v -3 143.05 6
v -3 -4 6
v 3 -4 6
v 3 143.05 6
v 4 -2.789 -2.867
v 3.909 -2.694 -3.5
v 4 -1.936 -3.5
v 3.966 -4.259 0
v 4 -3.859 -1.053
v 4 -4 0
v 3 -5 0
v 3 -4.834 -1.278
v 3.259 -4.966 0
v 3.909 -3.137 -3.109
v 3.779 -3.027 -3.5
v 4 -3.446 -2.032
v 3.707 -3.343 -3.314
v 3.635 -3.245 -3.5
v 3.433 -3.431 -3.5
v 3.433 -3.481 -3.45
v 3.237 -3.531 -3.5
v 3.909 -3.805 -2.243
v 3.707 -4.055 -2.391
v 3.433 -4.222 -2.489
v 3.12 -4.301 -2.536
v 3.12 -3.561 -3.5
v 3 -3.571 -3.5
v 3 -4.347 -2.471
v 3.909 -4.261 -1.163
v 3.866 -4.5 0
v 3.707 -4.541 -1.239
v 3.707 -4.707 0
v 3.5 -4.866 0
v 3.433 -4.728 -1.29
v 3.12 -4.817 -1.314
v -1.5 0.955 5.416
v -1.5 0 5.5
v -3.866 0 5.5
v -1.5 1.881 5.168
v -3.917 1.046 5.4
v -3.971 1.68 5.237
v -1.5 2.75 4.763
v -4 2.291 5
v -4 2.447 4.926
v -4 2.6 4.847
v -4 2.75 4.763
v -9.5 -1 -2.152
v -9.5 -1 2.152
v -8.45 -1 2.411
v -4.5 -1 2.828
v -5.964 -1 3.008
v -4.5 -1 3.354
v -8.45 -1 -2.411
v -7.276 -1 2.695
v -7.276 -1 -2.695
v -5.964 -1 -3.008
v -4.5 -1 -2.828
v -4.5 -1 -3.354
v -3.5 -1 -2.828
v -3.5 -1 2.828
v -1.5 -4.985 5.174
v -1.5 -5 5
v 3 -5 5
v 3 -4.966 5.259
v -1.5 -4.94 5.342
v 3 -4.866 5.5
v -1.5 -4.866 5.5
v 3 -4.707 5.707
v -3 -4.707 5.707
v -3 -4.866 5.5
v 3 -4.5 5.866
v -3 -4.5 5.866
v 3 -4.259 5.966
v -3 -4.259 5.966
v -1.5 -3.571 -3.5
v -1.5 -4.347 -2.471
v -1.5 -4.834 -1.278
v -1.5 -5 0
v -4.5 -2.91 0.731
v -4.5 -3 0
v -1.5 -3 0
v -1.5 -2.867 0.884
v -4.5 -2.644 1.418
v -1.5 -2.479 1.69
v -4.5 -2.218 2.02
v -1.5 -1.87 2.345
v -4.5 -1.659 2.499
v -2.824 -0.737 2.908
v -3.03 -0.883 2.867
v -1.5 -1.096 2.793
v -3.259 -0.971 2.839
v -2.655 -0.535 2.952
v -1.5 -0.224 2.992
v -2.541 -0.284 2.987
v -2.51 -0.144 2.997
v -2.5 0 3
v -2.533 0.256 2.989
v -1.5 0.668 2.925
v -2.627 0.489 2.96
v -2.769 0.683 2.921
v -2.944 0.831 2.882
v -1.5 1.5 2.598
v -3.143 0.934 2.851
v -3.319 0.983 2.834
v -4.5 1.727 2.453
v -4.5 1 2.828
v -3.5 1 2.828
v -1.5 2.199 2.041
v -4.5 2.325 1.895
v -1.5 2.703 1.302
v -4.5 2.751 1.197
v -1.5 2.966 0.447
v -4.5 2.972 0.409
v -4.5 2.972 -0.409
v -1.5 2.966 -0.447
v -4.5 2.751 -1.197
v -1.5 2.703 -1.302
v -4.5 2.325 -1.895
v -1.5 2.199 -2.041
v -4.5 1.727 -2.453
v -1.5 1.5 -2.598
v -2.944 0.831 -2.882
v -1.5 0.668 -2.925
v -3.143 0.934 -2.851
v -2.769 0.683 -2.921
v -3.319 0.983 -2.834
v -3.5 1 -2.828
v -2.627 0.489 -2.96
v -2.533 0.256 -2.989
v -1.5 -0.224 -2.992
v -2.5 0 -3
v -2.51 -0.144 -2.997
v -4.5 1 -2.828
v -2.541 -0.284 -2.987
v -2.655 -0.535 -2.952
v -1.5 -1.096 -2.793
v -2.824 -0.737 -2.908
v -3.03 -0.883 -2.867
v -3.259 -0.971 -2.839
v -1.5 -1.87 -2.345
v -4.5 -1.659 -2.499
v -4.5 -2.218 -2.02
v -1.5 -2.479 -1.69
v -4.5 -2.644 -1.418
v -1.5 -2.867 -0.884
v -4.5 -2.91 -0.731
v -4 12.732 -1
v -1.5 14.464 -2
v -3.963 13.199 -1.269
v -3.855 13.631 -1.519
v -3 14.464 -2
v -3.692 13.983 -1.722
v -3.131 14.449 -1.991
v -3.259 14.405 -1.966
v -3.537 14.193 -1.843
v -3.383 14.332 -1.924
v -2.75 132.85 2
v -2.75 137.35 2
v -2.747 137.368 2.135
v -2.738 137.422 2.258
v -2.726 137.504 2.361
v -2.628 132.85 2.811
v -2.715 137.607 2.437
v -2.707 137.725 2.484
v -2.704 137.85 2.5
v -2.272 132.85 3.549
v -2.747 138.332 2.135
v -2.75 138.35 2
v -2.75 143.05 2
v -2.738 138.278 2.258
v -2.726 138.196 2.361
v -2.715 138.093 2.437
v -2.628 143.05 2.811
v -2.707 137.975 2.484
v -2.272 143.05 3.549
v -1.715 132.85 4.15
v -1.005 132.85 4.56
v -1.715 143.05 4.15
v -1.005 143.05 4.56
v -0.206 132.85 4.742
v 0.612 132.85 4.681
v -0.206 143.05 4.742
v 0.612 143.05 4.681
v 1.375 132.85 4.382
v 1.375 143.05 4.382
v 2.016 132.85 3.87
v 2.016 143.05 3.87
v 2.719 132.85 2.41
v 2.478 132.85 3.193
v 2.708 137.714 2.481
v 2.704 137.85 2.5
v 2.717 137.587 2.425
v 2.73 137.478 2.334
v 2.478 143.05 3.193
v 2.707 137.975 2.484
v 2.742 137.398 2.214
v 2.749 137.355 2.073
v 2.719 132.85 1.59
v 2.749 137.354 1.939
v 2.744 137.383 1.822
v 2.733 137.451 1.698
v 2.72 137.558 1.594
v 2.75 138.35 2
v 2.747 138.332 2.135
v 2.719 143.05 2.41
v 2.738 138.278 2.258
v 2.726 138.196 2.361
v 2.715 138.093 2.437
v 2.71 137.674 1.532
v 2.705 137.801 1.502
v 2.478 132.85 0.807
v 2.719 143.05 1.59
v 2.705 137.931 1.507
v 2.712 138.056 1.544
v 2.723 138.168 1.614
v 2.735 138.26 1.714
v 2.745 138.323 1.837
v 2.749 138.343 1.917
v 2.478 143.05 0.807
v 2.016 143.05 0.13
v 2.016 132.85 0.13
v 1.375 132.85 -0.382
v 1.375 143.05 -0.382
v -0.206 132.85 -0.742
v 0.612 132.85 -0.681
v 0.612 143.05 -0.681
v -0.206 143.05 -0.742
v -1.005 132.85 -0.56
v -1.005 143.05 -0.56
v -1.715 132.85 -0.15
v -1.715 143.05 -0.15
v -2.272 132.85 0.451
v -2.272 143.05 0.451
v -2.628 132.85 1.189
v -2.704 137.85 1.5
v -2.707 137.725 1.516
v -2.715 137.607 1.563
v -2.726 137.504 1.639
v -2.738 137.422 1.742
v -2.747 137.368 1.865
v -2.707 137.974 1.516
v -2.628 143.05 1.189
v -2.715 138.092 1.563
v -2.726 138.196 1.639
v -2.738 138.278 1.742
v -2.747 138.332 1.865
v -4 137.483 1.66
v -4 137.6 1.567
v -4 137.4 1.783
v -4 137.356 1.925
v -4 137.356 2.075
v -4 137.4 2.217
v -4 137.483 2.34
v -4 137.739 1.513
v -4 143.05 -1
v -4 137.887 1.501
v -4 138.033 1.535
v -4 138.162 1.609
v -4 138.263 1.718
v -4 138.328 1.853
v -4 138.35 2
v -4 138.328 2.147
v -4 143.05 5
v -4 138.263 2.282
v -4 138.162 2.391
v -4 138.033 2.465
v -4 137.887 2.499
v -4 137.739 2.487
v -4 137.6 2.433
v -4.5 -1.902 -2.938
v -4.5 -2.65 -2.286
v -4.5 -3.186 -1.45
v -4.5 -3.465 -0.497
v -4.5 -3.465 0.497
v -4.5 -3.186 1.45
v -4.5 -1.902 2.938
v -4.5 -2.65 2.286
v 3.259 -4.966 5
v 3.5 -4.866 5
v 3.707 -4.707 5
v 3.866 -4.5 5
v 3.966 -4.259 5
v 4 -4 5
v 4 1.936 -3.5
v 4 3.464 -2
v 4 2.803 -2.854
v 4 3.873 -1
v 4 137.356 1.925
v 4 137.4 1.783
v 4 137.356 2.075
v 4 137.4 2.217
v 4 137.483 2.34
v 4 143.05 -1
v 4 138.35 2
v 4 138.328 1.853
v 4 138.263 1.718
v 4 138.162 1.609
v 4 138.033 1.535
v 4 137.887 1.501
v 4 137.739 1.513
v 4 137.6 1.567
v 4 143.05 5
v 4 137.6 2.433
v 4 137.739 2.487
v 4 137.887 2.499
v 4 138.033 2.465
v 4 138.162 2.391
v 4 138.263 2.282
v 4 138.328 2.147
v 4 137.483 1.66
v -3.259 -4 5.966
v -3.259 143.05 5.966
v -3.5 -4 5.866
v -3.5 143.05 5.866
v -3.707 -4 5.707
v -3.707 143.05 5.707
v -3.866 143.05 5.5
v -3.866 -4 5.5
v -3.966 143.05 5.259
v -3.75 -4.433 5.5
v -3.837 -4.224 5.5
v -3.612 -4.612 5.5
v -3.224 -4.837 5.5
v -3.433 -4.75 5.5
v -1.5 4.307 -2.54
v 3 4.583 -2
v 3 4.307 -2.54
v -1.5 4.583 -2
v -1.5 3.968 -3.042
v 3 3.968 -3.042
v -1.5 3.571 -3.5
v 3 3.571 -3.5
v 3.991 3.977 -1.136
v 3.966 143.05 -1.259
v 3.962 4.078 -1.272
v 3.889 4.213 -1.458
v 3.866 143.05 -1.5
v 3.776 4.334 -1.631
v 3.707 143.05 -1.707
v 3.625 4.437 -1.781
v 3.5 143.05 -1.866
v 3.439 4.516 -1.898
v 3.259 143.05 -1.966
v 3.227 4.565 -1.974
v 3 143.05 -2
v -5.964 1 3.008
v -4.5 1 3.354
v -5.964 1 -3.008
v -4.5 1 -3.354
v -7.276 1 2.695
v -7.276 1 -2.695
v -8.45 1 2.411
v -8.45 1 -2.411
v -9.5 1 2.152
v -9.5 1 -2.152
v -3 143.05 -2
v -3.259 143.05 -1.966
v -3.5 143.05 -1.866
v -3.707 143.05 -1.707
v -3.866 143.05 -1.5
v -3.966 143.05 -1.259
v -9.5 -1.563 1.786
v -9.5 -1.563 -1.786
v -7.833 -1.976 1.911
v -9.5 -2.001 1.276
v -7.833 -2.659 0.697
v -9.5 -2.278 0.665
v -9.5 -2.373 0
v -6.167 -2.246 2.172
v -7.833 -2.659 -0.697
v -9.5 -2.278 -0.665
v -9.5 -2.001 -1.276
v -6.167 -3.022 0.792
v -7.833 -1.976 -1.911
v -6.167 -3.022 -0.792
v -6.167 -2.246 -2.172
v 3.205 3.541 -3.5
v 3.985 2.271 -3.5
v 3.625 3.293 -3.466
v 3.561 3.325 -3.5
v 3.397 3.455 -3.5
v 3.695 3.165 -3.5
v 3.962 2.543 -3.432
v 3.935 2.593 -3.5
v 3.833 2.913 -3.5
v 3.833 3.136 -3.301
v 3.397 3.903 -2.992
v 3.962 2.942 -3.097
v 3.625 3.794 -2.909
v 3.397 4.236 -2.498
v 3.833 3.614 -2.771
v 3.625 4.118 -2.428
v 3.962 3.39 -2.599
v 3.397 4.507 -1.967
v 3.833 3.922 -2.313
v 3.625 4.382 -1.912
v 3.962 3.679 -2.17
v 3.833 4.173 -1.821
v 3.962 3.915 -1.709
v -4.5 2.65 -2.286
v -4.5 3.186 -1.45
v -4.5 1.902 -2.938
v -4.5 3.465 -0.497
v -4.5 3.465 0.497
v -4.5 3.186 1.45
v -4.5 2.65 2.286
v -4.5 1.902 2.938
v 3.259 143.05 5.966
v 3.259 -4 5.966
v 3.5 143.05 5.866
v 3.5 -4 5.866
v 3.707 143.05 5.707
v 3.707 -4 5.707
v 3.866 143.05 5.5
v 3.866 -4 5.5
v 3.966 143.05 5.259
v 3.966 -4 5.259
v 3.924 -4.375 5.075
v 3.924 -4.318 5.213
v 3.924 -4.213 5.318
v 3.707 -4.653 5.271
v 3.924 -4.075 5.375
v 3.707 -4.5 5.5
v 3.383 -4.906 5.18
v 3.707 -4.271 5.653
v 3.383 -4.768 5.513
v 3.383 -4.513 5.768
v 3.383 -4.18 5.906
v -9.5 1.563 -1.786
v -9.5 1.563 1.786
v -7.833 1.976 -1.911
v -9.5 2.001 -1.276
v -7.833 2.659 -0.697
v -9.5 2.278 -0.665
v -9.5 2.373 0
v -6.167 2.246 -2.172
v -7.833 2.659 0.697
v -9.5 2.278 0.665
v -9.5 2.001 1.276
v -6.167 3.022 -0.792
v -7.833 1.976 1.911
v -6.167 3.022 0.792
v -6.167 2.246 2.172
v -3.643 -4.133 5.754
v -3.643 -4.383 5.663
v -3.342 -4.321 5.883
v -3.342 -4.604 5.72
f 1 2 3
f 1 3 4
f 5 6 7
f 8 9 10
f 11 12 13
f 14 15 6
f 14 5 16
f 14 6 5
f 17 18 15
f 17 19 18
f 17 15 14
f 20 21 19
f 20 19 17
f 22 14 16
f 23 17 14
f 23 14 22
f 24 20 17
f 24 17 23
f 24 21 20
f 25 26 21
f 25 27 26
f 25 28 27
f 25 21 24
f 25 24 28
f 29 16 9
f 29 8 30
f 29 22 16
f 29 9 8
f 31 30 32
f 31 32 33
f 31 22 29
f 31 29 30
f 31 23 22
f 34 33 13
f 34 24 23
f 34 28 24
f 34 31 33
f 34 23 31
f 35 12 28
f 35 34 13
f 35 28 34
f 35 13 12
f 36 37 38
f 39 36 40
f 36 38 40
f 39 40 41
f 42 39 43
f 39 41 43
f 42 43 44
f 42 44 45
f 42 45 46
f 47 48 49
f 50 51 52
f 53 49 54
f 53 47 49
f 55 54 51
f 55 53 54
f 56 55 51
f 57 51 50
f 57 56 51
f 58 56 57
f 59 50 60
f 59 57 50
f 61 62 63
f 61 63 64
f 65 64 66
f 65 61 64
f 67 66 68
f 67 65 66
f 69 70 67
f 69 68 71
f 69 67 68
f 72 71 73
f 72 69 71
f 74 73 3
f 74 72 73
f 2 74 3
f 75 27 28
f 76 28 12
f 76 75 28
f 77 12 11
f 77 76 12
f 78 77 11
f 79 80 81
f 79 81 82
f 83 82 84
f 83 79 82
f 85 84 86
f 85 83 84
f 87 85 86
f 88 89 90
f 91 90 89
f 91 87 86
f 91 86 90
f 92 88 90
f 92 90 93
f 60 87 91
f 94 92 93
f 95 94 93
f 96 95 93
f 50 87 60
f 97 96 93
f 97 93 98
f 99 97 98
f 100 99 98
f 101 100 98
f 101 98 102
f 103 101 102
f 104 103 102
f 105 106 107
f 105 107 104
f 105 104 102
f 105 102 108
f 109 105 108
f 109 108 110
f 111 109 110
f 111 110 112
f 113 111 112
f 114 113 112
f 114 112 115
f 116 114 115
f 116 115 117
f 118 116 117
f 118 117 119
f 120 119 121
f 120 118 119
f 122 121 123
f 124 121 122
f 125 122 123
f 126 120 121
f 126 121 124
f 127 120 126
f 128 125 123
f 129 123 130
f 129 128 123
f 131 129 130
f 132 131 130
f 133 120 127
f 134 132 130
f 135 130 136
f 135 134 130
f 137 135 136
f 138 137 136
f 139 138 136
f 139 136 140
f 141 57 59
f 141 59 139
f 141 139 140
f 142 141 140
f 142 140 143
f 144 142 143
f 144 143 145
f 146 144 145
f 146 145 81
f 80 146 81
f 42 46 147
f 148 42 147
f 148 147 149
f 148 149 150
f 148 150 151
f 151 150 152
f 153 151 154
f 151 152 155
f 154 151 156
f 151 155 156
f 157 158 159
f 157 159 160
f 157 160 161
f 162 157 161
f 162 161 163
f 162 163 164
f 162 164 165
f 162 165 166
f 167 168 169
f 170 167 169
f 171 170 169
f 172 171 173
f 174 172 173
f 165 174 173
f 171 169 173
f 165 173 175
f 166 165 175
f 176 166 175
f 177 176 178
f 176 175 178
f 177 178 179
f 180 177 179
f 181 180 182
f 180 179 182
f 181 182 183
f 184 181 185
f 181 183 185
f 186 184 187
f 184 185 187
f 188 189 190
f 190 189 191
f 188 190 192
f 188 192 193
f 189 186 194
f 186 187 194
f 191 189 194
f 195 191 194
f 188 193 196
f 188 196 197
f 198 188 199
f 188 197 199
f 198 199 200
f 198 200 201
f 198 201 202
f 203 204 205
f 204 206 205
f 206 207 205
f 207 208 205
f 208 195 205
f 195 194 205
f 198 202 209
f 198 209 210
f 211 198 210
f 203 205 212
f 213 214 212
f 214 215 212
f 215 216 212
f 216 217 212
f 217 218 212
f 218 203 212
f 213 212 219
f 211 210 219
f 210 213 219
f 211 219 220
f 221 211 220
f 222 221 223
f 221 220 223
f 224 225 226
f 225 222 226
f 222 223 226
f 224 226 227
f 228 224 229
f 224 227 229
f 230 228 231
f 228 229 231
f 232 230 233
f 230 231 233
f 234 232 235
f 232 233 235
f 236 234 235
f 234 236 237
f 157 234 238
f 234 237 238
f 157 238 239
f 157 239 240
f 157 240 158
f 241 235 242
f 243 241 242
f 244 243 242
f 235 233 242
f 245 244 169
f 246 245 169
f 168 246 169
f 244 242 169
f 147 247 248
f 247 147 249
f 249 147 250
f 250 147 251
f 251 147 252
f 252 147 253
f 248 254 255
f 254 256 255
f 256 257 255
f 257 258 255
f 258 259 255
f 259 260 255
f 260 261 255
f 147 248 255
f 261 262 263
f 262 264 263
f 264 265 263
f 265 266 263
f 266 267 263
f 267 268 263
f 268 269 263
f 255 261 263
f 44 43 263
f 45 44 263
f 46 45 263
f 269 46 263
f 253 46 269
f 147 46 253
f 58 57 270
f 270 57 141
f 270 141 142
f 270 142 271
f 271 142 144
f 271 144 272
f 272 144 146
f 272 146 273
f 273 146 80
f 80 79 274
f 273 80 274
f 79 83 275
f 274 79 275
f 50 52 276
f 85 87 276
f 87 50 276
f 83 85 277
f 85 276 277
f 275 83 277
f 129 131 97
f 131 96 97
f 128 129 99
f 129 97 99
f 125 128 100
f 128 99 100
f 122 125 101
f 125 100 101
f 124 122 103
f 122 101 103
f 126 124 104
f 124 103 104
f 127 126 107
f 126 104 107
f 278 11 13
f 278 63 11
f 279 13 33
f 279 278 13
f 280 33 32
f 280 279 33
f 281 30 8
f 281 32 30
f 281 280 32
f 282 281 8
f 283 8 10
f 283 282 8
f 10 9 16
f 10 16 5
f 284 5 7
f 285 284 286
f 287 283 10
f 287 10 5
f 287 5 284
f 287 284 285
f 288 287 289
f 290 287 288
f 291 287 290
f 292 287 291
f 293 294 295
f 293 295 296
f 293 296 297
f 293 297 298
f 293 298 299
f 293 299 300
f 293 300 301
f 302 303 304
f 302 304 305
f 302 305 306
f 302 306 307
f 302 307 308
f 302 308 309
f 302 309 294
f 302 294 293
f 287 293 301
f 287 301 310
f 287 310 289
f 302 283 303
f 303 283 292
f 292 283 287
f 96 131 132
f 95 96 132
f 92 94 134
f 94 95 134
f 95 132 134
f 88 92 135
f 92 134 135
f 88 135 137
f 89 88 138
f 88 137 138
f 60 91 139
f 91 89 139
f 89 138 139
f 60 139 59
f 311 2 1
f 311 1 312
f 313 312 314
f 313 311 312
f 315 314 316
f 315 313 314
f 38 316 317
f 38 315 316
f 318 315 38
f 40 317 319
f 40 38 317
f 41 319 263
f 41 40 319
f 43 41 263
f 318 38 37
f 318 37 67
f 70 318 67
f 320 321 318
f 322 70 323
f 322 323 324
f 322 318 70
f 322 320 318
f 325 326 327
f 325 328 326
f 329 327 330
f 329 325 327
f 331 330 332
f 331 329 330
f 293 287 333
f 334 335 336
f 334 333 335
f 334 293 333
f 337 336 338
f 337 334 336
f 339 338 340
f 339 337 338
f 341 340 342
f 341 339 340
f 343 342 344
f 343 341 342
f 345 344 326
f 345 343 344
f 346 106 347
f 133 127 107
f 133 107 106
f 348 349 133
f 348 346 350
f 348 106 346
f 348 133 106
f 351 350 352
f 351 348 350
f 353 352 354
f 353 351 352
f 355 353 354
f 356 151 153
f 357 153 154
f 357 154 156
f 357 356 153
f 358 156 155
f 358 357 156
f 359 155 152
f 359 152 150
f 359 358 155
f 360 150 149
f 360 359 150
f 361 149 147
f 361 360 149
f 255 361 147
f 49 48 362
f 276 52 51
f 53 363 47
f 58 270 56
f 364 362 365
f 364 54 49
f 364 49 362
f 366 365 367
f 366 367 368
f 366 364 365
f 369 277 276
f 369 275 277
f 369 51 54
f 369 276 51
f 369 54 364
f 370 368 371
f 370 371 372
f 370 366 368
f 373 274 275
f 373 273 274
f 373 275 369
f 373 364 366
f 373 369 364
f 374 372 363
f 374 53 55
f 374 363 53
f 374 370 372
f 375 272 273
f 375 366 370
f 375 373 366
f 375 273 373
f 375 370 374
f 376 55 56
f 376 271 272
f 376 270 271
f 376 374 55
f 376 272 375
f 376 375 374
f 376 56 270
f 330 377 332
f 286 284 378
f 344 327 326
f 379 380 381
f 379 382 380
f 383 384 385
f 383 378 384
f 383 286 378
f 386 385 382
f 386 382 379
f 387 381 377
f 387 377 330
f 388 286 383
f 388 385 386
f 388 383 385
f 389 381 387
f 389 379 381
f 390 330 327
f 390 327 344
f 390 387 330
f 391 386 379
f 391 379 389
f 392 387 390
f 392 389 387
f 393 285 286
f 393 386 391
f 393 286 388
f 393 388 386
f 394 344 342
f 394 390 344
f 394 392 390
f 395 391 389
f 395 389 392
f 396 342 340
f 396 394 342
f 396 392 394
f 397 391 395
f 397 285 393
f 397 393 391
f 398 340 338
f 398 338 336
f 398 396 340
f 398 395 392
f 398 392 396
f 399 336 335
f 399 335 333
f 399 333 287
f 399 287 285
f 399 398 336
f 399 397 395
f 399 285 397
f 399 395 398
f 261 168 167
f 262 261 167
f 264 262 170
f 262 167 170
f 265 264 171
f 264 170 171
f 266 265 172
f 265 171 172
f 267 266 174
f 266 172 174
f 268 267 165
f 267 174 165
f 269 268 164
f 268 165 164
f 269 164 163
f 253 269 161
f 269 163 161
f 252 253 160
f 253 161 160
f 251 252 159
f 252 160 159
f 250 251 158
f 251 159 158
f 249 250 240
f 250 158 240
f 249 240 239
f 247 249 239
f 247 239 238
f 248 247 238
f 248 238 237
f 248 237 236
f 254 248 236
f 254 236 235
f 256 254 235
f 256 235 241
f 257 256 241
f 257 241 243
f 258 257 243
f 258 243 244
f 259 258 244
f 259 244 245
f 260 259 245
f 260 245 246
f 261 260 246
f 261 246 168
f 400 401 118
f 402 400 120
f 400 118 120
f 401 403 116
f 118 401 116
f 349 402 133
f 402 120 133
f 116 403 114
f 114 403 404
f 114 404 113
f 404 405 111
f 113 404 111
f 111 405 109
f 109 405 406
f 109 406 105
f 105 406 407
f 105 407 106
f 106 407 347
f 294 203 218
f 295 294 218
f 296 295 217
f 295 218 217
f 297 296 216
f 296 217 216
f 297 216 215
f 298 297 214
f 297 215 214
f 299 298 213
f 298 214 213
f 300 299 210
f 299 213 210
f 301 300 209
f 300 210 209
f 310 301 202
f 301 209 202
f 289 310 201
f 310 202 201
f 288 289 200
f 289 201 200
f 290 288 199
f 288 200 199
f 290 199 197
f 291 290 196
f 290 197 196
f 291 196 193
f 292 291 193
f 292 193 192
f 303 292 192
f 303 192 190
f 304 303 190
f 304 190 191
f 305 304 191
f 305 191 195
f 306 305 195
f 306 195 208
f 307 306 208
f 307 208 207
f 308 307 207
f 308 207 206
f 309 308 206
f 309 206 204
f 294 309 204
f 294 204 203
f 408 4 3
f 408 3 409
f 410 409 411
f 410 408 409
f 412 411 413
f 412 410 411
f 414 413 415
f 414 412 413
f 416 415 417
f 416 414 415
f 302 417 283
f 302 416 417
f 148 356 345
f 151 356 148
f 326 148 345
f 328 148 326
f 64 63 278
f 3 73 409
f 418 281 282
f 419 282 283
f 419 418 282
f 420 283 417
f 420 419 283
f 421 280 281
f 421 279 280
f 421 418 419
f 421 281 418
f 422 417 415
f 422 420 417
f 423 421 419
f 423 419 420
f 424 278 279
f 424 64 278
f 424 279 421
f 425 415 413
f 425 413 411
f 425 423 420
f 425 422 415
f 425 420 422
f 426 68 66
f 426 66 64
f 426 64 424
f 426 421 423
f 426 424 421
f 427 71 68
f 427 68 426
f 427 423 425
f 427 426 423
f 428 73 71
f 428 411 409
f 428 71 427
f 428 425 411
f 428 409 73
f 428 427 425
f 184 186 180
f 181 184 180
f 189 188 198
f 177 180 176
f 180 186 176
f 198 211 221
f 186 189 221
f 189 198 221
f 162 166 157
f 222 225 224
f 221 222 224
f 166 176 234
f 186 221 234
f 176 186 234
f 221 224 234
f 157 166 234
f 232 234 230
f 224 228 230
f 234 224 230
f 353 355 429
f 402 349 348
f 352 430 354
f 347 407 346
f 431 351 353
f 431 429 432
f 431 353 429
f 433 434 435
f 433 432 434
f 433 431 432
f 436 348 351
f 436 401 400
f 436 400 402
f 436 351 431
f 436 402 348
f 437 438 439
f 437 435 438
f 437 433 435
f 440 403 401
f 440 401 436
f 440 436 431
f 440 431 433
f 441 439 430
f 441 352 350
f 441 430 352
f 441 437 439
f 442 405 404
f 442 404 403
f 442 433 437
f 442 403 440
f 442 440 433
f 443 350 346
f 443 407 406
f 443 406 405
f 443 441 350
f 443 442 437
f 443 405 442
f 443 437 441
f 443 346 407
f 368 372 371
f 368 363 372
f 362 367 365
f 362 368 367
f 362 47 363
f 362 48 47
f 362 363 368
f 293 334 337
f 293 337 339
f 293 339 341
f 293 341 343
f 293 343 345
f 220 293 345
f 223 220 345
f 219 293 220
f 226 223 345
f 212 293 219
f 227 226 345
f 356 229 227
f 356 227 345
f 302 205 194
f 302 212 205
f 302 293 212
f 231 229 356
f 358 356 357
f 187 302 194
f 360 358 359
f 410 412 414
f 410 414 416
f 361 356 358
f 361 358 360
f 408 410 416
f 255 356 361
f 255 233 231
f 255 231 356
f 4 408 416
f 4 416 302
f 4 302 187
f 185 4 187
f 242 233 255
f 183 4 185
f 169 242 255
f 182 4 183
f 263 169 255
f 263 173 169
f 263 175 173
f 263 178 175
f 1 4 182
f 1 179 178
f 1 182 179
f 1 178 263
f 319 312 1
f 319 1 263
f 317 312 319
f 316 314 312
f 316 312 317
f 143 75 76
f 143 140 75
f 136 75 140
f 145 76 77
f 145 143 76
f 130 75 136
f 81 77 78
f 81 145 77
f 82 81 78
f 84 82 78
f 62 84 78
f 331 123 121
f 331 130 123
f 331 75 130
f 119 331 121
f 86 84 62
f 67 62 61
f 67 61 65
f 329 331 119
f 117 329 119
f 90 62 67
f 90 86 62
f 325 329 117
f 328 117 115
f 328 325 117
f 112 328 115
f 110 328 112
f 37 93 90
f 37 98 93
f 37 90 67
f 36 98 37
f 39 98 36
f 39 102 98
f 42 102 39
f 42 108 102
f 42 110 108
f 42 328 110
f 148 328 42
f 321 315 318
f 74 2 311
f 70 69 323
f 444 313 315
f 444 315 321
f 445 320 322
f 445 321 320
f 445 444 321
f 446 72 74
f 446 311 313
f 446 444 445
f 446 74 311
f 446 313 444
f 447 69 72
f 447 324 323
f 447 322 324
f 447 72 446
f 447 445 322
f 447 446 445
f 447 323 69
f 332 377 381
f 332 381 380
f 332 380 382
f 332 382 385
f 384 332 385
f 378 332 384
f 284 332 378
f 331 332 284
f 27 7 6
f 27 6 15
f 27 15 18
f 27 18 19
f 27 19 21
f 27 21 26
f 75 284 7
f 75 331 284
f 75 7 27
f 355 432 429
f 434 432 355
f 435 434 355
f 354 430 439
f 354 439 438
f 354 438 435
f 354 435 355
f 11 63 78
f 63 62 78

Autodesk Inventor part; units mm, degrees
ref_plane "YZ Plane" through (0, 0, 0) normal (1, 0, 0) x (0, 1, 0)
ref_plane "XY Plane" through (0, 0, 0) normal (0, 0, 1) x (1, 0, 0)
sketch "Boceto1" plane through (0, 0, 0) normal (1, 0, 0) x (0, 1, 0)
  circle A0 centre (0, 0) radius 5
  line L0 (0, 0) -> (0, 6)
  line L1 (0, 6) -> (-4, 6)
  line L2 (-5, 5) -> (-5, 0)
  line L3 (0, 6) -> (181.05, 6)
  line L4 (181.05, 6) -> (187.5, 6)
  line L5 (187.5, 6) -> (189.65, 6)
  line L6 (190.65, 5) -> (190.65, -1)
  line L7 (189.65, -2) -> (4.5826, -2)
  arc A1 (-4, 6) -> (-5, 5) centre (-4, 5) ccw
  arc A2 (190.65, 5) -> (189.65, 6) centre (189.65, 5) ccw
  arc A3 (189.65, -2) -> (190.65, -1) centre (189.65, -1) ccw
  line L8 (3.5707, -3.5) -> (-3.5707, -3.5)
  point P0 (-5, 6)
  point P1 (190.65, 6)
  point P2 (190.65, -2)
  dimension "d0" = 10
  dimension "d1" = 6
  dimension "d2" = 5
  dimension "d3" = 181.05
  dimension "d4" = 6.45
  dimension "d5" = 3.15
  dimension "d6" = 8
  dimension "d7" = 1
  dimension "d8" = 1
  dimension "d45" = 1.5
extrude "Extrusión1" add sketch "Boceto1" along normal mid plane 8 contours A0 L8 | L2 A1 L1 L0 A0 | L0 L3 L4 L5 A2 L6 A3 L7 A0 picked at (0, -0.6667)
fillet "Empalme1" radius 1 18 edges at (-4, 190.3571, 5.7071) (-4, 190.65, 2) (-4, 190.3571, -1.7071) (-4, 97.1163, -2) (-4, -4.7071, 5.7071) (-4, -5, 2.5) (-4, -4.6289, -1.8903) (-4, 4.1451, -2.7962) (-4, 92.825, 6) (4, -4.7071, 5.7071) (4, -5, 2.5) (4, -4.6289, -1.8903) (4, 4.1451, -2.7962) (4, 190.3571, 5.7071) (4, 190.65, 2) (4, 190.3571, -1.7071) (4, 97.1163, -2) (4, 92.825, 6)
sketch "Boceto2" plane through (-4, 0, 0) normal (-1, 0, 0) x (0, 0, 1)
  circle A0 centre (0, 0) radius 5.5
  line L0 (4.7631, 2.75) -> (-2, 14.4641)
  line L1 (-2, 189.65) -> (-2, 4.5826) projected
  line L2 (5.5, 0) -> (5.5, -5.5)
  line L3 (0, -5) -> (5, -5) projected
  line L4 (0, -5.5) -> (5.5, -5.5)
  line L5 (-2, 14.4641) -> (-2, 5.1235)
  dimension "d12" = 11
  dimension "d13" = 30
extrude "Extrusión2" cut sketch "Boceto2" against normal blind 2.5
sketch "Boceto3" plane through (0, 0, 0) normal (0, 0, 1) x (1, 0, 0)
  line L0 (-3, 190.65) -> (3, 190.65) projected
  line L1 (0, 190.65) -> (0, 181.05)
  line L2 (1.4, 190.65) -> (1.4, 181.05)
  line L3 (-1.4, 190.65) -> (-1.4, 181.05)
  line L4 (1.4, 190.65) -> (-1.4, 190.65)
  line L5 (0, 181.05) -> (1.4, 181.05)
  line L6 (0, 181.05) -> (-1.4, 181.05)
  point P0 (0, 0)
  dimension "d16" = 9.6
  dimension "d17" = 1.4
  dimension "d18" = 1.4
extrude "Extrusión3" cut sketch "Boceto3" along normal mid plane 16
fillet "Empalme4" radius 1 2 edges at (-1.4, 181.05, 2) (1.4, 181.05, 2)
sketch "Boceto11" plane through (0, 0, 0) normal (1, 0, 0) x (0, 1, 0)
  line L0 (0, 0) -> (0, 6)
  line L1 (0, 6) -> (181.05, 6)
  line L2 (189.65, 6) -> (-4, 6) projected
  line L3 (181.05, 6) -> (187.5, 6)
  line L4 (187.5, 6) -> (187.5, 0.55)
  circle A0 centre (187.5, 0.55) radius 1.15
  dimension "d66" = 6
  dimension "d67" = 181.05
  dimension "d68" = 6.45
  dimension "d69" = 5.45
  dimension "d70" = 2.3
extrude "Extrusión9" cut sketch "Boceto11" along normal through all both and the other way through all
sketch "Boceto6" plane through (0, 0, 0) normal (0, 0, 1) x (1, 0, 0)
  line L0 (0, 0) -> (-1.5, 0)
  line L1 (-1.5, 0) -> (-1.5, -3)
  line L2 (-1.5, -5) -> (-1.5, 4.5826) projected
  line L3 (-1.5, -3) -> (-4.5, -3)
  line L4 (-1.5, 0) -> (-9.5, 0)
  line L5 (-4.5, -3) -> (-4.5, -3.5)
  line L6 (-9.5, 0) -> (-9.5, -2.3732)
  line L7 (-9.5, -2.3732) -> (-4.5, -3.5)
  dimension "d27" = 1.5
  dimension "d28" = 3
  dimension "d29" = 3
  dimension "d30" = 8
  dimension "d31" = 0.5
  dimension "d32" = 2.3732
revolve "Revolución1" add sketch "Boceto6" angle 360 about axis through (-1.5, 0, 0) along (-1, 0, 0)
sketch "Boceto7" plane through (0, 0, 0) normal (0, 0, 1) x (1, 0, 0)
  line L0 (0, 0) -> (-1.5, 0)
  line L1 (-1.5, 0) -> (-4.5, 0)
  line L2 (-4.5, 0) -> (-9.5, 0)
  line L3 (-9.5, 0) -> (-9.5, -1)
  line L4 (-9.5, 2.3732) -> (-9.5, -2.3732) projected
  line L5 (-9.5, -1) -> (-2.5, -1)
  line L6 (-2.5, -1) -> (-2.5, 1)
  line L7 (-2.5, 1) -> (-9.5, 1)
  line L8 (-9.5, 1) -> (-9.5, 0)
  point P0 (-9.5, 1)
  dimension "d34" = 1.5
  dimension "d35" = 3
  dimension "d36" = 5
  dimension "d37" = 1
  dimension "d38" = 7
  dimension "d39" = 2
extrude "Extrusión5" cut sketch "Boceto7" along normal mid plane 7
fillet "Empalme2" radius 1 2 edges at (-2.5, -1, 0) (-2.5, 1, 0)
ref_plane "Plano de trabajo2" through (0, 177.05, 0) normal (0, 1, 0) x (-1, 0, 0)
sketch "Boceto8" plane through (0, 177.05, 0) normal (0, 1, 0) x (-1, 0, 0)
  line L0 (0, 0) -> (0, 2)
  line L1 (16, 18) -> (-16, 18)
  line L2 (-16, 18) -> (-16, -14)
  line L3 (-16, -14) -> (16, -14)
  line L4 (16, -14) -> (16, 18)
  line L5 (16, 18) -> (-16, -14) construction
  line L6 (-16, 18) -> (16, -14) construction
  point P0 (0, 0)
  dimension "d49" = 2
  dimension "d50" = 32
  dimension "d51" = 32
  dimension "d78" = 0
extrude "Extrusión6" cut sketch "Boceto8" against normal blind 34
sketch "Boceto9" plane through (0, 177.05, 0) normal (0, -1, 0) x (-1, 0, 0)
  line L0 (3, -6) -> (-3, -6) projected
  line L1 (0, 0) -> (0, -2)
  circle A0 centre (0, -2) radius 2.75
  point P0 (0, 0)
  point P1 (-2.6, -6)
  dimension "d55" = 2
  dimension "d56" = 5.5
  dimension "d79" = 0
  dimension "d80" = 0
extrude "Extrusión7" cut sketch "Boceto9" along normal blind 44.2
sketch "Boceto10" plane through (0, 177.05, 0) normal (0, -1, 0) x (-1, 0, 0)
  circle A0 centre (0, -2) radius 2.6 projected
  circle A1 centre (0, -2) radius 3
  point P0 (0, 0)
  dimension "d59" = 6
extrude "Extrusión8" [suppressed]
fillet "Empalme3" [suppressed]
sketch "Boceto13" plane through (0, 143.05, 0) normal (0, 1, 0) x (1, 0, 0)
  line L0 (16, -16) -> (-16, -16)
  line L1 (-16, -16) -> (-16, 16)
  line L2 (-16, 16) -> (16, 16)
  line L3 (16, 16) -> (16, -16)
  line L4 (16, -16) -> (-16, 16) construction
  line L5 (-16, -16) -> (16, 16) construction
  point P0 (0, 0)
  dimension "d81" = 32
  dimension "d82" = 32
extrude "Extrusión10" cut sketch "Boceto13" along normal blind 181.05
sketch "Boceto14" plane through (0, 0, 0) normal (1, 0, 0) x (0, 1, 0)
  line L0 (0, 0) -> (0, 6)
  line L1 (0, 6) -> (137.85, 6)
  line L2 (137.85, 6) -> (137.85, 2)
  circle A0 centre (137.85, 2) radius 0.5
  dimension "d85" = 6
  dimension "d86" = 137.85
  dimension "d87" = 4
  dimension "d88" = 1
extrude "Extrusión11" cut sketch "Boceto14" along normal through all both and the other way through all
equation "\"d0\" = width_r3"
equation "\"d1\" = 0.5 * width_r3 + offset"
equation "\"d2\" = 0.5 * width_r3"
equation "\"d3\" = lenght_body_link - 0.5 * width_r3"
equation "\"d4\" = shaft_y"
equation "\"d5\" = 0.5 * Djoint_shaft + 2 * offset"
equation "\"d6\" = width_link"
equation "\"d45\" = 1.5 * offset"
equation "\"d9\" = width_link"
equation "\"d12\" = width_r3 + offset"
equation "\"d14\" = 0.5 * width_link - 0.5 * t_thikness"
equation "\"d16\" = 0.5 * Djoint_shaft + 2 * offset + shaft_y"
equation "\"d17\" = 0.25 * offset + 0.5 * wire_D"
equation "\"d18\" = 0.25 * offset + 0.5 * wire_D"
equation "\"d19\" = 2 * width_link"
equation "\"d63\" = offset"
equation "\"d27\" = 0.5 * t_thikness"
equation "\"d28\" = 0.5 * sj_diam_shaft"
equation "\"d29\" = t_thikness"
equation "\"d30\" = t_thikness + sj_head_height"
equation "\"d31\" = 0.5 * sj_head_D - 0.5 * sj_diam_shaft"
equation "\"d32\" = 0.5 * sj_head_d"
equation "\"d34\" = 0.5 * t_thikness"
equation "\"d35\" = t_thikness"
equation "\"d36\" = sj_head_height"
equation "\"d37\" = 0.5 * sj_groove"
equation "\"d38\" = sj_groove_deep"
equation "\"d39\" = sj_groove"
equation "\"d40\" = sj_head_D"
equation "\"d46\" = 0.5 * sj_groove"
equation "\"d52\" = spring_lenght + 3 * thikness"
equation "\"d59\" = spring_int_d"
equation "\"d60\" = thikness"
equation "\"d62\" = offset"
equation "\"offset\" = 1"
equation "\"wire_D\" = 2.3"
equation "\"width_link\" = 8"
equation "\"Djoint_shaft\" = 2.3"
equation "\"shaft_x\" = 1.45"
equation "\"shaft_y\" = 6.45"
equation "\"lenght_body_link\" = 186.05"
equation "\"m2_theta3f\" = -60deg"
equation "\"width_r3\" = 10"
equation "\"t_thikness\" = 3"
equation "\"sj_diam_shaft\" = 6"
equation "\"sj_groove\" = 2"
equation "\"sj_groove_deep\" = 7"
equation "\"sj_head_D\" = 7"
equation "\"sj_head_d\" = 4.7464"
equation "\"sj_head_height\" = 5"
equation "\"thikness\" = 2"
equation "\"spring_int_d\" = 6"
equation "\"spring_lenght\" = 28"
equation "\"r1\" = 5.55"
equation "\"r2o\" = 59.75"
equation "\"delta_y\" = 6"
equation "\"wire_d\" = 1"
equation "\"width_ang_spring\" = 5"
equation "\"spring_int_diam\" = 8.5"
equation "\"spring_ext_diam\" = 10.5"
equation "\"r3\" = 8.25"
equation "\"r3R\" = 4.75"
equation "\"r3T\" = 6.74537"
equation "\"alpha\" = 54.847297deg"
equation "\"alpha2\" = 270deg"
equation "\"theta3_recogido\" = 305.152703deg"
equation "\"delta_theta_3\" = 45deg"
equation "\"joint_width\" = 12"
equation "\"joint_radius\" = 7.75"
equation "\"shaft_width\" = 15"
equation "\"shaft_joint_diameter\" = 7.75"
equation "\"separation_space\" = 0.5"
equation "\"height_finger\" = 42"
equation "\"cell_screw_head_diameter\" = 4"
equation "\"cell_screw_diameter\" = 2"
equation "\"cell_space\" = 2"
equation "\"cell_width\" = 6"
equation "\"cell_theta_position\" = 60deg"
equation "\"cell_thikness\" = 1"
equation "\"cell_lenght\" = 37"
equation "\"cell_z_space\" = 5"
equation "\"Dt\" = 1.05949"
equation "\"lenght_bar_support\" = 201.65"
equation "\"wire_spring_d\" = 1"
equation "\"trigger_offset\" = 2"
equation "\"m2_theta2o\" = 107deg"
equation "\"m2_r2\" = 28"
equation "\"e\" = 9"
equation "\"So\" = 17"
equation "\"m2_theta3o\" = -30deg"
equation "\"m2_r3\" = 19.75"
equation "\"m2_delta_theta1\" = 15deg"
equation "\"trigger_thumb_lenght\" = 6"
equation "\"width_r12\" = 8"
equation "\"m2_r1\" = 25.2"
equation "\"r3_thikness\" = 3.5"
equation "\"tg_width\" = 4"
equation "\"pivot_screw_d\" = 4"
equation "\"pivot_diameter\" = 7"
equation "\"sf_lenght\" = 9.5"
equation "\"sf_base\" = 3"
equation "\"sf_head_height\" = 3"
equation "\"sf_head_width\" = 4.5"
equation "\"sf_head_offset\" = 0.25"
equation "\"sf_head_grip_width\" = 2"
equation "\"sf_head_angle\" = 45deg"
equation "\"sf_thikness\" = 5"
equation "\"screw_Dhead\" = 8"
equation "\"screw_d\" = 4"
equation "\"screw_lenght\" = 12"
equation "\"screwJ_base_D\" = 9"
equation "\"screwJ_top_D\" = 13"
equation "\"gj_D\" = 6"
equation "\"gj_d\" = 4"
equation "\"gj_out_section\" = 6"
equation "\"agarradera_theta\" = 60deg"
equation "\"agarradera_width\" = 4"
equation "\"sfbox_theta1\" = 60deg"
equation "\"sfbox_theta2\" = 45deg"
equation "\"position\" = 39.13077"
equation "\"fat_width_slider\" = 2"
equation "\"sfbox_tip_width\" = 2.5"
equation "\"flex_separation_theta\" = 60deg"
equation "\"sf_flex_separation\" = 38.66667"
equation "\"ext_width_slider\" = 3.5"
equation "\"sf_box_width\" = 1.5"
equation "\"slim_width_slider\" = 1.5"
equation "\"sfbox_width\" = 1.5"
equation "\"int_width_slider\" = 2"
equation "\"box_fat_slider_lenght\" = 67"
equation "\"box_slim_slider_lenght\" = 116"
equation "\"thikness_box\" = 1.5"
equation "\"box_in_height\" = 35"
equation "\"box_in_width\" = 72"
equation "\"box_in_deep\" = 77"
equation "\"agarradera_position\" = 82.13077"
properties part number "Eslabón conector M2" material "Plástico PPS"
